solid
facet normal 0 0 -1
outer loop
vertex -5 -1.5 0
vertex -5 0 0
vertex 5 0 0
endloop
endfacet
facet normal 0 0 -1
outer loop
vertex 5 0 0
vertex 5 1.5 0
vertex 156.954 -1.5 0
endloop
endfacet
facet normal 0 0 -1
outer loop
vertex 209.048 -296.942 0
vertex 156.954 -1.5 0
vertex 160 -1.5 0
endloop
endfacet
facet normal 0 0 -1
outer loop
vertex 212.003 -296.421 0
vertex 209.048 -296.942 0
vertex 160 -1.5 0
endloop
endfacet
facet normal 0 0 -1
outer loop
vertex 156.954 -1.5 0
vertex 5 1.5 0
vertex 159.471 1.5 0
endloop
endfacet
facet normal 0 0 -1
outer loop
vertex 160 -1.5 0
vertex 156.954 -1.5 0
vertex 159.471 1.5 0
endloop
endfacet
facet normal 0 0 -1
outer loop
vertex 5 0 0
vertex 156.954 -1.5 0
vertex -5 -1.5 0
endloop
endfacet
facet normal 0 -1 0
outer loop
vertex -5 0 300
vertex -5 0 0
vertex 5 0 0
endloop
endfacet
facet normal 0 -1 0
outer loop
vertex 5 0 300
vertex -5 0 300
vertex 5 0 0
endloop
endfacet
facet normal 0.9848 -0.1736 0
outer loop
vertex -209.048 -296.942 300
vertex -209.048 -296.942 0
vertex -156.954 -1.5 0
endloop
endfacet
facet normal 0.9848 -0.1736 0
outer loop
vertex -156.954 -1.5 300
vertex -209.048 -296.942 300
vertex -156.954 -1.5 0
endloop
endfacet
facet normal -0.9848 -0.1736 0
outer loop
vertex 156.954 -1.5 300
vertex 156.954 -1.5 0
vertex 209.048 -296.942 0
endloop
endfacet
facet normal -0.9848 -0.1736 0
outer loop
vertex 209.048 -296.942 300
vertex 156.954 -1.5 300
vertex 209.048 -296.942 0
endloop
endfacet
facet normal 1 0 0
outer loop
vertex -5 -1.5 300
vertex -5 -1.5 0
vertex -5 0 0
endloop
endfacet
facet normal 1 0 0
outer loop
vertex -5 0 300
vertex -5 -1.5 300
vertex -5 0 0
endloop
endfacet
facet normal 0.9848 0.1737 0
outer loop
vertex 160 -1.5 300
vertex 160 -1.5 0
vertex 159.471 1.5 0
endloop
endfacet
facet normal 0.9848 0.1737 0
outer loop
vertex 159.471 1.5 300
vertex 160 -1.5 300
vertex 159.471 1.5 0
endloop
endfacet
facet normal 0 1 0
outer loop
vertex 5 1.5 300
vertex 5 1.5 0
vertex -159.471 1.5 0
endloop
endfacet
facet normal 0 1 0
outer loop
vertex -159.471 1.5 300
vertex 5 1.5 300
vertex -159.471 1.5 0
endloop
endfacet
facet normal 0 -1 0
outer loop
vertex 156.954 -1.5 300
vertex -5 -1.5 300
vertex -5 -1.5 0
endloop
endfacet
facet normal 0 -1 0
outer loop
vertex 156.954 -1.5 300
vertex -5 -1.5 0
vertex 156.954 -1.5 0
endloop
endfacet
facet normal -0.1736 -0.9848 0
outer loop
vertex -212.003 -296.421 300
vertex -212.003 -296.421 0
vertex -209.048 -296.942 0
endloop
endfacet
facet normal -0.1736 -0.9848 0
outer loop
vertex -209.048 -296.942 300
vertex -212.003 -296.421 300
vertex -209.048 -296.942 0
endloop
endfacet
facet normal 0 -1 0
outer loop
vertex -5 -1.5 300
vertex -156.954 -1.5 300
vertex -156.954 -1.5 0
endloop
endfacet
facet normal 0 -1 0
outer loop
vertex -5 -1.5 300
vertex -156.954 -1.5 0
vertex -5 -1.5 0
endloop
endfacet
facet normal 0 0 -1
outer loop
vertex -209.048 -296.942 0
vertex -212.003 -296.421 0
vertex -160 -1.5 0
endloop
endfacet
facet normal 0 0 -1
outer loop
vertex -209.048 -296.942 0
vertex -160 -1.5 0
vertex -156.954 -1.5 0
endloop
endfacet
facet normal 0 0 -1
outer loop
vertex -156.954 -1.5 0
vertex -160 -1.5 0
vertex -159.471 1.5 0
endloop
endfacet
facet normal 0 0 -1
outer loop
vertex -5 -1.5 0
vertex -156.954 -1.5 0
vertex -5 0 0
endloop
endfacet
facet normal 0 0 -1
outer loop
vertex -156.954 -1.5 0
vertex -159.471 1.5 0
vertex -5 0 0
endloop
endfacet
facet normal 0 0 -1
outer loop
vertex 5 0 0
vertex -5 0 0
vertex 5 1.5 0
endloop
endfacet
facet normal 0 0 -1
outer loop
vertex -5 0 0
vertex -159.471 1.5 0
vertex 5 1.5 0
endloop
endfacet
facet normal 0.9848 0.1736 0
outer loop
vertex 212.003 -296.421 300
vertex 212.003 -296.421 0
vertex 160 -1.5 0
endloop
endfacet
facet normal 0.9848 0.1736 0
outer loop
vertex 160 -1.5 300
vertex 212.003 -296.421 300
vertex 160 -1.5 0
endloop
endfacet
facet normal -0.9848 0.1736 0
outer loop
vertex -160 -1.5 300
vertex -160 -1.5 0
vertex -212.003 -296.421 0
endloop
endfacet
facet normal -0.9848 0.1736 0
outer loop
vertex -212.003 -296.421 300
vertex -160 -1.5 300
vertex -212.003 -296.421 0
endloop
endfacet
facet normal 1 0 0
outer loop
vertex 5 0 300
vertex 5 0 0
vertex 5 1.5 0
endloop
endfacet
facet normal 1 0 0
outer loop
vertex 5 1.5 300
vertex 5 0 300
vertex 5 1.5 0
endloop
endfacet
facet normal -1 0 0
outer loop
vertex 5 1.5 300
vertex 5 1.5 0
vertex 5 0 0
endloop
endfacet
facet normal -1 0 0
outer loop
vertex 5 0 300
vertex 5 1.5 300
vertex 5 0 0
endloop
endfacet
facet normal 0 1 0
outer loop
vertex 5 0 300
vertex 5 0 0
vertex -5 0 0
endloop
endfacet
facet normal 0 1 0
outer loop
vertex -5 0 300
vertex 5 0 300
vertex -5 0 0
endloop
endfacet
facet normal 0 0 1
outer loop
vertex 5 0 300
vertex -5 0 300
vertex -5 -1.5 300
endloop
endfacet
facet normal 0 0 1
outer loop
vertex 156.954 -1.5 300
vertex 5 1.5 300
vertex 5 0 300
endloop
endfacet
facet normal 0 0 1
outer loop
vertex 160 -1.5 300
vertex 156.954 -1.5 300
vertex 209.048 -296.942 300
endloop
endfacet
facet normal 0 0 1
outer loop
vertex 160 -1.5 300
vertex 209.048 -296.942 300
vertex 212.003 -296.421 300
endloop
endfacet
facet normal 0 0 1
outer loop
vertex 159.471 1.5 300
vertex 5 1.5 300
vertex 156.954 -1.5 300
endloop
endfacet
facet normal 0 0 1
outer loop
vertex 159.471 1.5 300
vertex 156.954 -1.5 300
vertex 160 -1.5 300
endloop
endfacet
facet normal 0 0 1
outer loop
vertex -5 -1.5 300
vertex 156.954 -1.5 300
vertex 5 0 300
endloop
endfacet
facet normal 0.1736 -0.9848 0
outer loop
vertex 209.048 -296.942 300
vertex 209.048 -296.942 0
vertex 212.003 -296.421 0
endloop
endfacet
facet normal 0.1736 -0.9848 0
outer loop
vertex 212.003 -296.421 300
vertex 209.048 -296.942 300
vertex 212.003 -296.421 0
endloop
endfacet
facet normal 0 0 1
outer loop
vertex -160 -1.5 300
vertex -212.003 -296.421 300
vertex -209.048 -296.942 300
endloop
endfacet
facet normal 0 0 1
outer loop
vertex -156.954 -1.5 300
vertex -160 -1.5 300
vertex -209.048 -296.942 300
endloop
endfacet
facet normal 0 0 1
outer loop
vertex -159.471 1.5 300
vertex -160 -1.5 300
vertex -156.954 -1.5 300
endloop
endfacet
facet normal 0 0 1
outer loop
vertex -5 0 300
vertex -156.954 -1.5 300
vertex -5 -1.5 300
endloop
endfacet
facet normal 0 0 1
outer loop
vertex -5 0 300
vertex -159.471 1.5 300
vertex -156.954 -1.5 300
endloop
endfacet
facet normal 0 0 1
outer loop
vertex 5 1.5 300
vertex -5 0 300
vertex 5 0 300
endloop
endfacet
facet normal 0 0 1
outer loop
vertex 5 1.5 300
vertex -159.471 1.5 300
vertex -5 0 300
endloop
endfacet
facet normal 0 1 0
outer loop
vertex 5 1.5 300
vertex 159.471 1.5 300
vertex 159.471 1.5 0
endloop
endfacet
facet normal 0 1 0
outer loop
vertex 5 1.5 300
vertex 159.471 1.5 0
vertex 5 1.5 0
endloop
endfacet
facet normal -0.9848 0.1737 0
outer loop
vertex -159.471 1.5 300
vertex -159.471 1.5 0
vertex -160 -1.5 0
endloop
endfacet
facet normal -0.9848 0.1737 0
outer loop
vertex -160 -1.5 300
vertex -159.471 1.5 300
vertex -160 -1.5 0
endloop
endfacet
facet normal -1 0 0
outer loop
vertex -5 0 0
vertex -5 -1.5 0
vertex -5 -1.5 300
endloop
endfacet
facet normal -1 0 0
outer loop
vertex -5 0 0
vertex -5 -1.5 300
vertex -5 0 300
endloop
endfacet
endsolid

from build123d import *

# Parameters (mm, degrees)
F0_W     = 5
F0_H     = 1.5
F1_DEPTH = 300
F2_DEPTH = 300


with BuildPart() as f1:
    # F0 (on Top) → F1 (new body)
    with BuildSketch(Plane.XY):
        Polygon((-156.95372, -1.5), (-160, -1.5), (-212.002597, -296.421381), (-209.048173, -296.942326), align=None)
        Polygon((0, 1.5), (-159.471019, 1.5), (-160, -1.5), (-156.95372, -1.5), (-5, -1.5), (-5, 0), (0, 0), align=None)
        with Locations((2.5, 0.75)):
            Rectangle(F0_W, F0_H)
    extrude(amount=F1_DEPTH)


with BuildPart() as f2:
    # F0 (on Top) → F2 (new body)
    with BuildSketch(Plane.XY):
        Polygon((159.471019, 1.5), (5, 1.5), (5, 0), (0, 0), (0, -1.5), (156.95372, -1.5), (160, -1.5), align=None)
        with Locations((-2.5, -0.75)):
            Rectangle(F0_W, F0_H)
        Polygon((212.002597, -296.421381), (160, -1.5), (156.95372, -1.5), (209.048173, -296.942326), align=None)
    extrude(amount=F2_DEPTH)


solid = Compound([f1.part, f2.part])
